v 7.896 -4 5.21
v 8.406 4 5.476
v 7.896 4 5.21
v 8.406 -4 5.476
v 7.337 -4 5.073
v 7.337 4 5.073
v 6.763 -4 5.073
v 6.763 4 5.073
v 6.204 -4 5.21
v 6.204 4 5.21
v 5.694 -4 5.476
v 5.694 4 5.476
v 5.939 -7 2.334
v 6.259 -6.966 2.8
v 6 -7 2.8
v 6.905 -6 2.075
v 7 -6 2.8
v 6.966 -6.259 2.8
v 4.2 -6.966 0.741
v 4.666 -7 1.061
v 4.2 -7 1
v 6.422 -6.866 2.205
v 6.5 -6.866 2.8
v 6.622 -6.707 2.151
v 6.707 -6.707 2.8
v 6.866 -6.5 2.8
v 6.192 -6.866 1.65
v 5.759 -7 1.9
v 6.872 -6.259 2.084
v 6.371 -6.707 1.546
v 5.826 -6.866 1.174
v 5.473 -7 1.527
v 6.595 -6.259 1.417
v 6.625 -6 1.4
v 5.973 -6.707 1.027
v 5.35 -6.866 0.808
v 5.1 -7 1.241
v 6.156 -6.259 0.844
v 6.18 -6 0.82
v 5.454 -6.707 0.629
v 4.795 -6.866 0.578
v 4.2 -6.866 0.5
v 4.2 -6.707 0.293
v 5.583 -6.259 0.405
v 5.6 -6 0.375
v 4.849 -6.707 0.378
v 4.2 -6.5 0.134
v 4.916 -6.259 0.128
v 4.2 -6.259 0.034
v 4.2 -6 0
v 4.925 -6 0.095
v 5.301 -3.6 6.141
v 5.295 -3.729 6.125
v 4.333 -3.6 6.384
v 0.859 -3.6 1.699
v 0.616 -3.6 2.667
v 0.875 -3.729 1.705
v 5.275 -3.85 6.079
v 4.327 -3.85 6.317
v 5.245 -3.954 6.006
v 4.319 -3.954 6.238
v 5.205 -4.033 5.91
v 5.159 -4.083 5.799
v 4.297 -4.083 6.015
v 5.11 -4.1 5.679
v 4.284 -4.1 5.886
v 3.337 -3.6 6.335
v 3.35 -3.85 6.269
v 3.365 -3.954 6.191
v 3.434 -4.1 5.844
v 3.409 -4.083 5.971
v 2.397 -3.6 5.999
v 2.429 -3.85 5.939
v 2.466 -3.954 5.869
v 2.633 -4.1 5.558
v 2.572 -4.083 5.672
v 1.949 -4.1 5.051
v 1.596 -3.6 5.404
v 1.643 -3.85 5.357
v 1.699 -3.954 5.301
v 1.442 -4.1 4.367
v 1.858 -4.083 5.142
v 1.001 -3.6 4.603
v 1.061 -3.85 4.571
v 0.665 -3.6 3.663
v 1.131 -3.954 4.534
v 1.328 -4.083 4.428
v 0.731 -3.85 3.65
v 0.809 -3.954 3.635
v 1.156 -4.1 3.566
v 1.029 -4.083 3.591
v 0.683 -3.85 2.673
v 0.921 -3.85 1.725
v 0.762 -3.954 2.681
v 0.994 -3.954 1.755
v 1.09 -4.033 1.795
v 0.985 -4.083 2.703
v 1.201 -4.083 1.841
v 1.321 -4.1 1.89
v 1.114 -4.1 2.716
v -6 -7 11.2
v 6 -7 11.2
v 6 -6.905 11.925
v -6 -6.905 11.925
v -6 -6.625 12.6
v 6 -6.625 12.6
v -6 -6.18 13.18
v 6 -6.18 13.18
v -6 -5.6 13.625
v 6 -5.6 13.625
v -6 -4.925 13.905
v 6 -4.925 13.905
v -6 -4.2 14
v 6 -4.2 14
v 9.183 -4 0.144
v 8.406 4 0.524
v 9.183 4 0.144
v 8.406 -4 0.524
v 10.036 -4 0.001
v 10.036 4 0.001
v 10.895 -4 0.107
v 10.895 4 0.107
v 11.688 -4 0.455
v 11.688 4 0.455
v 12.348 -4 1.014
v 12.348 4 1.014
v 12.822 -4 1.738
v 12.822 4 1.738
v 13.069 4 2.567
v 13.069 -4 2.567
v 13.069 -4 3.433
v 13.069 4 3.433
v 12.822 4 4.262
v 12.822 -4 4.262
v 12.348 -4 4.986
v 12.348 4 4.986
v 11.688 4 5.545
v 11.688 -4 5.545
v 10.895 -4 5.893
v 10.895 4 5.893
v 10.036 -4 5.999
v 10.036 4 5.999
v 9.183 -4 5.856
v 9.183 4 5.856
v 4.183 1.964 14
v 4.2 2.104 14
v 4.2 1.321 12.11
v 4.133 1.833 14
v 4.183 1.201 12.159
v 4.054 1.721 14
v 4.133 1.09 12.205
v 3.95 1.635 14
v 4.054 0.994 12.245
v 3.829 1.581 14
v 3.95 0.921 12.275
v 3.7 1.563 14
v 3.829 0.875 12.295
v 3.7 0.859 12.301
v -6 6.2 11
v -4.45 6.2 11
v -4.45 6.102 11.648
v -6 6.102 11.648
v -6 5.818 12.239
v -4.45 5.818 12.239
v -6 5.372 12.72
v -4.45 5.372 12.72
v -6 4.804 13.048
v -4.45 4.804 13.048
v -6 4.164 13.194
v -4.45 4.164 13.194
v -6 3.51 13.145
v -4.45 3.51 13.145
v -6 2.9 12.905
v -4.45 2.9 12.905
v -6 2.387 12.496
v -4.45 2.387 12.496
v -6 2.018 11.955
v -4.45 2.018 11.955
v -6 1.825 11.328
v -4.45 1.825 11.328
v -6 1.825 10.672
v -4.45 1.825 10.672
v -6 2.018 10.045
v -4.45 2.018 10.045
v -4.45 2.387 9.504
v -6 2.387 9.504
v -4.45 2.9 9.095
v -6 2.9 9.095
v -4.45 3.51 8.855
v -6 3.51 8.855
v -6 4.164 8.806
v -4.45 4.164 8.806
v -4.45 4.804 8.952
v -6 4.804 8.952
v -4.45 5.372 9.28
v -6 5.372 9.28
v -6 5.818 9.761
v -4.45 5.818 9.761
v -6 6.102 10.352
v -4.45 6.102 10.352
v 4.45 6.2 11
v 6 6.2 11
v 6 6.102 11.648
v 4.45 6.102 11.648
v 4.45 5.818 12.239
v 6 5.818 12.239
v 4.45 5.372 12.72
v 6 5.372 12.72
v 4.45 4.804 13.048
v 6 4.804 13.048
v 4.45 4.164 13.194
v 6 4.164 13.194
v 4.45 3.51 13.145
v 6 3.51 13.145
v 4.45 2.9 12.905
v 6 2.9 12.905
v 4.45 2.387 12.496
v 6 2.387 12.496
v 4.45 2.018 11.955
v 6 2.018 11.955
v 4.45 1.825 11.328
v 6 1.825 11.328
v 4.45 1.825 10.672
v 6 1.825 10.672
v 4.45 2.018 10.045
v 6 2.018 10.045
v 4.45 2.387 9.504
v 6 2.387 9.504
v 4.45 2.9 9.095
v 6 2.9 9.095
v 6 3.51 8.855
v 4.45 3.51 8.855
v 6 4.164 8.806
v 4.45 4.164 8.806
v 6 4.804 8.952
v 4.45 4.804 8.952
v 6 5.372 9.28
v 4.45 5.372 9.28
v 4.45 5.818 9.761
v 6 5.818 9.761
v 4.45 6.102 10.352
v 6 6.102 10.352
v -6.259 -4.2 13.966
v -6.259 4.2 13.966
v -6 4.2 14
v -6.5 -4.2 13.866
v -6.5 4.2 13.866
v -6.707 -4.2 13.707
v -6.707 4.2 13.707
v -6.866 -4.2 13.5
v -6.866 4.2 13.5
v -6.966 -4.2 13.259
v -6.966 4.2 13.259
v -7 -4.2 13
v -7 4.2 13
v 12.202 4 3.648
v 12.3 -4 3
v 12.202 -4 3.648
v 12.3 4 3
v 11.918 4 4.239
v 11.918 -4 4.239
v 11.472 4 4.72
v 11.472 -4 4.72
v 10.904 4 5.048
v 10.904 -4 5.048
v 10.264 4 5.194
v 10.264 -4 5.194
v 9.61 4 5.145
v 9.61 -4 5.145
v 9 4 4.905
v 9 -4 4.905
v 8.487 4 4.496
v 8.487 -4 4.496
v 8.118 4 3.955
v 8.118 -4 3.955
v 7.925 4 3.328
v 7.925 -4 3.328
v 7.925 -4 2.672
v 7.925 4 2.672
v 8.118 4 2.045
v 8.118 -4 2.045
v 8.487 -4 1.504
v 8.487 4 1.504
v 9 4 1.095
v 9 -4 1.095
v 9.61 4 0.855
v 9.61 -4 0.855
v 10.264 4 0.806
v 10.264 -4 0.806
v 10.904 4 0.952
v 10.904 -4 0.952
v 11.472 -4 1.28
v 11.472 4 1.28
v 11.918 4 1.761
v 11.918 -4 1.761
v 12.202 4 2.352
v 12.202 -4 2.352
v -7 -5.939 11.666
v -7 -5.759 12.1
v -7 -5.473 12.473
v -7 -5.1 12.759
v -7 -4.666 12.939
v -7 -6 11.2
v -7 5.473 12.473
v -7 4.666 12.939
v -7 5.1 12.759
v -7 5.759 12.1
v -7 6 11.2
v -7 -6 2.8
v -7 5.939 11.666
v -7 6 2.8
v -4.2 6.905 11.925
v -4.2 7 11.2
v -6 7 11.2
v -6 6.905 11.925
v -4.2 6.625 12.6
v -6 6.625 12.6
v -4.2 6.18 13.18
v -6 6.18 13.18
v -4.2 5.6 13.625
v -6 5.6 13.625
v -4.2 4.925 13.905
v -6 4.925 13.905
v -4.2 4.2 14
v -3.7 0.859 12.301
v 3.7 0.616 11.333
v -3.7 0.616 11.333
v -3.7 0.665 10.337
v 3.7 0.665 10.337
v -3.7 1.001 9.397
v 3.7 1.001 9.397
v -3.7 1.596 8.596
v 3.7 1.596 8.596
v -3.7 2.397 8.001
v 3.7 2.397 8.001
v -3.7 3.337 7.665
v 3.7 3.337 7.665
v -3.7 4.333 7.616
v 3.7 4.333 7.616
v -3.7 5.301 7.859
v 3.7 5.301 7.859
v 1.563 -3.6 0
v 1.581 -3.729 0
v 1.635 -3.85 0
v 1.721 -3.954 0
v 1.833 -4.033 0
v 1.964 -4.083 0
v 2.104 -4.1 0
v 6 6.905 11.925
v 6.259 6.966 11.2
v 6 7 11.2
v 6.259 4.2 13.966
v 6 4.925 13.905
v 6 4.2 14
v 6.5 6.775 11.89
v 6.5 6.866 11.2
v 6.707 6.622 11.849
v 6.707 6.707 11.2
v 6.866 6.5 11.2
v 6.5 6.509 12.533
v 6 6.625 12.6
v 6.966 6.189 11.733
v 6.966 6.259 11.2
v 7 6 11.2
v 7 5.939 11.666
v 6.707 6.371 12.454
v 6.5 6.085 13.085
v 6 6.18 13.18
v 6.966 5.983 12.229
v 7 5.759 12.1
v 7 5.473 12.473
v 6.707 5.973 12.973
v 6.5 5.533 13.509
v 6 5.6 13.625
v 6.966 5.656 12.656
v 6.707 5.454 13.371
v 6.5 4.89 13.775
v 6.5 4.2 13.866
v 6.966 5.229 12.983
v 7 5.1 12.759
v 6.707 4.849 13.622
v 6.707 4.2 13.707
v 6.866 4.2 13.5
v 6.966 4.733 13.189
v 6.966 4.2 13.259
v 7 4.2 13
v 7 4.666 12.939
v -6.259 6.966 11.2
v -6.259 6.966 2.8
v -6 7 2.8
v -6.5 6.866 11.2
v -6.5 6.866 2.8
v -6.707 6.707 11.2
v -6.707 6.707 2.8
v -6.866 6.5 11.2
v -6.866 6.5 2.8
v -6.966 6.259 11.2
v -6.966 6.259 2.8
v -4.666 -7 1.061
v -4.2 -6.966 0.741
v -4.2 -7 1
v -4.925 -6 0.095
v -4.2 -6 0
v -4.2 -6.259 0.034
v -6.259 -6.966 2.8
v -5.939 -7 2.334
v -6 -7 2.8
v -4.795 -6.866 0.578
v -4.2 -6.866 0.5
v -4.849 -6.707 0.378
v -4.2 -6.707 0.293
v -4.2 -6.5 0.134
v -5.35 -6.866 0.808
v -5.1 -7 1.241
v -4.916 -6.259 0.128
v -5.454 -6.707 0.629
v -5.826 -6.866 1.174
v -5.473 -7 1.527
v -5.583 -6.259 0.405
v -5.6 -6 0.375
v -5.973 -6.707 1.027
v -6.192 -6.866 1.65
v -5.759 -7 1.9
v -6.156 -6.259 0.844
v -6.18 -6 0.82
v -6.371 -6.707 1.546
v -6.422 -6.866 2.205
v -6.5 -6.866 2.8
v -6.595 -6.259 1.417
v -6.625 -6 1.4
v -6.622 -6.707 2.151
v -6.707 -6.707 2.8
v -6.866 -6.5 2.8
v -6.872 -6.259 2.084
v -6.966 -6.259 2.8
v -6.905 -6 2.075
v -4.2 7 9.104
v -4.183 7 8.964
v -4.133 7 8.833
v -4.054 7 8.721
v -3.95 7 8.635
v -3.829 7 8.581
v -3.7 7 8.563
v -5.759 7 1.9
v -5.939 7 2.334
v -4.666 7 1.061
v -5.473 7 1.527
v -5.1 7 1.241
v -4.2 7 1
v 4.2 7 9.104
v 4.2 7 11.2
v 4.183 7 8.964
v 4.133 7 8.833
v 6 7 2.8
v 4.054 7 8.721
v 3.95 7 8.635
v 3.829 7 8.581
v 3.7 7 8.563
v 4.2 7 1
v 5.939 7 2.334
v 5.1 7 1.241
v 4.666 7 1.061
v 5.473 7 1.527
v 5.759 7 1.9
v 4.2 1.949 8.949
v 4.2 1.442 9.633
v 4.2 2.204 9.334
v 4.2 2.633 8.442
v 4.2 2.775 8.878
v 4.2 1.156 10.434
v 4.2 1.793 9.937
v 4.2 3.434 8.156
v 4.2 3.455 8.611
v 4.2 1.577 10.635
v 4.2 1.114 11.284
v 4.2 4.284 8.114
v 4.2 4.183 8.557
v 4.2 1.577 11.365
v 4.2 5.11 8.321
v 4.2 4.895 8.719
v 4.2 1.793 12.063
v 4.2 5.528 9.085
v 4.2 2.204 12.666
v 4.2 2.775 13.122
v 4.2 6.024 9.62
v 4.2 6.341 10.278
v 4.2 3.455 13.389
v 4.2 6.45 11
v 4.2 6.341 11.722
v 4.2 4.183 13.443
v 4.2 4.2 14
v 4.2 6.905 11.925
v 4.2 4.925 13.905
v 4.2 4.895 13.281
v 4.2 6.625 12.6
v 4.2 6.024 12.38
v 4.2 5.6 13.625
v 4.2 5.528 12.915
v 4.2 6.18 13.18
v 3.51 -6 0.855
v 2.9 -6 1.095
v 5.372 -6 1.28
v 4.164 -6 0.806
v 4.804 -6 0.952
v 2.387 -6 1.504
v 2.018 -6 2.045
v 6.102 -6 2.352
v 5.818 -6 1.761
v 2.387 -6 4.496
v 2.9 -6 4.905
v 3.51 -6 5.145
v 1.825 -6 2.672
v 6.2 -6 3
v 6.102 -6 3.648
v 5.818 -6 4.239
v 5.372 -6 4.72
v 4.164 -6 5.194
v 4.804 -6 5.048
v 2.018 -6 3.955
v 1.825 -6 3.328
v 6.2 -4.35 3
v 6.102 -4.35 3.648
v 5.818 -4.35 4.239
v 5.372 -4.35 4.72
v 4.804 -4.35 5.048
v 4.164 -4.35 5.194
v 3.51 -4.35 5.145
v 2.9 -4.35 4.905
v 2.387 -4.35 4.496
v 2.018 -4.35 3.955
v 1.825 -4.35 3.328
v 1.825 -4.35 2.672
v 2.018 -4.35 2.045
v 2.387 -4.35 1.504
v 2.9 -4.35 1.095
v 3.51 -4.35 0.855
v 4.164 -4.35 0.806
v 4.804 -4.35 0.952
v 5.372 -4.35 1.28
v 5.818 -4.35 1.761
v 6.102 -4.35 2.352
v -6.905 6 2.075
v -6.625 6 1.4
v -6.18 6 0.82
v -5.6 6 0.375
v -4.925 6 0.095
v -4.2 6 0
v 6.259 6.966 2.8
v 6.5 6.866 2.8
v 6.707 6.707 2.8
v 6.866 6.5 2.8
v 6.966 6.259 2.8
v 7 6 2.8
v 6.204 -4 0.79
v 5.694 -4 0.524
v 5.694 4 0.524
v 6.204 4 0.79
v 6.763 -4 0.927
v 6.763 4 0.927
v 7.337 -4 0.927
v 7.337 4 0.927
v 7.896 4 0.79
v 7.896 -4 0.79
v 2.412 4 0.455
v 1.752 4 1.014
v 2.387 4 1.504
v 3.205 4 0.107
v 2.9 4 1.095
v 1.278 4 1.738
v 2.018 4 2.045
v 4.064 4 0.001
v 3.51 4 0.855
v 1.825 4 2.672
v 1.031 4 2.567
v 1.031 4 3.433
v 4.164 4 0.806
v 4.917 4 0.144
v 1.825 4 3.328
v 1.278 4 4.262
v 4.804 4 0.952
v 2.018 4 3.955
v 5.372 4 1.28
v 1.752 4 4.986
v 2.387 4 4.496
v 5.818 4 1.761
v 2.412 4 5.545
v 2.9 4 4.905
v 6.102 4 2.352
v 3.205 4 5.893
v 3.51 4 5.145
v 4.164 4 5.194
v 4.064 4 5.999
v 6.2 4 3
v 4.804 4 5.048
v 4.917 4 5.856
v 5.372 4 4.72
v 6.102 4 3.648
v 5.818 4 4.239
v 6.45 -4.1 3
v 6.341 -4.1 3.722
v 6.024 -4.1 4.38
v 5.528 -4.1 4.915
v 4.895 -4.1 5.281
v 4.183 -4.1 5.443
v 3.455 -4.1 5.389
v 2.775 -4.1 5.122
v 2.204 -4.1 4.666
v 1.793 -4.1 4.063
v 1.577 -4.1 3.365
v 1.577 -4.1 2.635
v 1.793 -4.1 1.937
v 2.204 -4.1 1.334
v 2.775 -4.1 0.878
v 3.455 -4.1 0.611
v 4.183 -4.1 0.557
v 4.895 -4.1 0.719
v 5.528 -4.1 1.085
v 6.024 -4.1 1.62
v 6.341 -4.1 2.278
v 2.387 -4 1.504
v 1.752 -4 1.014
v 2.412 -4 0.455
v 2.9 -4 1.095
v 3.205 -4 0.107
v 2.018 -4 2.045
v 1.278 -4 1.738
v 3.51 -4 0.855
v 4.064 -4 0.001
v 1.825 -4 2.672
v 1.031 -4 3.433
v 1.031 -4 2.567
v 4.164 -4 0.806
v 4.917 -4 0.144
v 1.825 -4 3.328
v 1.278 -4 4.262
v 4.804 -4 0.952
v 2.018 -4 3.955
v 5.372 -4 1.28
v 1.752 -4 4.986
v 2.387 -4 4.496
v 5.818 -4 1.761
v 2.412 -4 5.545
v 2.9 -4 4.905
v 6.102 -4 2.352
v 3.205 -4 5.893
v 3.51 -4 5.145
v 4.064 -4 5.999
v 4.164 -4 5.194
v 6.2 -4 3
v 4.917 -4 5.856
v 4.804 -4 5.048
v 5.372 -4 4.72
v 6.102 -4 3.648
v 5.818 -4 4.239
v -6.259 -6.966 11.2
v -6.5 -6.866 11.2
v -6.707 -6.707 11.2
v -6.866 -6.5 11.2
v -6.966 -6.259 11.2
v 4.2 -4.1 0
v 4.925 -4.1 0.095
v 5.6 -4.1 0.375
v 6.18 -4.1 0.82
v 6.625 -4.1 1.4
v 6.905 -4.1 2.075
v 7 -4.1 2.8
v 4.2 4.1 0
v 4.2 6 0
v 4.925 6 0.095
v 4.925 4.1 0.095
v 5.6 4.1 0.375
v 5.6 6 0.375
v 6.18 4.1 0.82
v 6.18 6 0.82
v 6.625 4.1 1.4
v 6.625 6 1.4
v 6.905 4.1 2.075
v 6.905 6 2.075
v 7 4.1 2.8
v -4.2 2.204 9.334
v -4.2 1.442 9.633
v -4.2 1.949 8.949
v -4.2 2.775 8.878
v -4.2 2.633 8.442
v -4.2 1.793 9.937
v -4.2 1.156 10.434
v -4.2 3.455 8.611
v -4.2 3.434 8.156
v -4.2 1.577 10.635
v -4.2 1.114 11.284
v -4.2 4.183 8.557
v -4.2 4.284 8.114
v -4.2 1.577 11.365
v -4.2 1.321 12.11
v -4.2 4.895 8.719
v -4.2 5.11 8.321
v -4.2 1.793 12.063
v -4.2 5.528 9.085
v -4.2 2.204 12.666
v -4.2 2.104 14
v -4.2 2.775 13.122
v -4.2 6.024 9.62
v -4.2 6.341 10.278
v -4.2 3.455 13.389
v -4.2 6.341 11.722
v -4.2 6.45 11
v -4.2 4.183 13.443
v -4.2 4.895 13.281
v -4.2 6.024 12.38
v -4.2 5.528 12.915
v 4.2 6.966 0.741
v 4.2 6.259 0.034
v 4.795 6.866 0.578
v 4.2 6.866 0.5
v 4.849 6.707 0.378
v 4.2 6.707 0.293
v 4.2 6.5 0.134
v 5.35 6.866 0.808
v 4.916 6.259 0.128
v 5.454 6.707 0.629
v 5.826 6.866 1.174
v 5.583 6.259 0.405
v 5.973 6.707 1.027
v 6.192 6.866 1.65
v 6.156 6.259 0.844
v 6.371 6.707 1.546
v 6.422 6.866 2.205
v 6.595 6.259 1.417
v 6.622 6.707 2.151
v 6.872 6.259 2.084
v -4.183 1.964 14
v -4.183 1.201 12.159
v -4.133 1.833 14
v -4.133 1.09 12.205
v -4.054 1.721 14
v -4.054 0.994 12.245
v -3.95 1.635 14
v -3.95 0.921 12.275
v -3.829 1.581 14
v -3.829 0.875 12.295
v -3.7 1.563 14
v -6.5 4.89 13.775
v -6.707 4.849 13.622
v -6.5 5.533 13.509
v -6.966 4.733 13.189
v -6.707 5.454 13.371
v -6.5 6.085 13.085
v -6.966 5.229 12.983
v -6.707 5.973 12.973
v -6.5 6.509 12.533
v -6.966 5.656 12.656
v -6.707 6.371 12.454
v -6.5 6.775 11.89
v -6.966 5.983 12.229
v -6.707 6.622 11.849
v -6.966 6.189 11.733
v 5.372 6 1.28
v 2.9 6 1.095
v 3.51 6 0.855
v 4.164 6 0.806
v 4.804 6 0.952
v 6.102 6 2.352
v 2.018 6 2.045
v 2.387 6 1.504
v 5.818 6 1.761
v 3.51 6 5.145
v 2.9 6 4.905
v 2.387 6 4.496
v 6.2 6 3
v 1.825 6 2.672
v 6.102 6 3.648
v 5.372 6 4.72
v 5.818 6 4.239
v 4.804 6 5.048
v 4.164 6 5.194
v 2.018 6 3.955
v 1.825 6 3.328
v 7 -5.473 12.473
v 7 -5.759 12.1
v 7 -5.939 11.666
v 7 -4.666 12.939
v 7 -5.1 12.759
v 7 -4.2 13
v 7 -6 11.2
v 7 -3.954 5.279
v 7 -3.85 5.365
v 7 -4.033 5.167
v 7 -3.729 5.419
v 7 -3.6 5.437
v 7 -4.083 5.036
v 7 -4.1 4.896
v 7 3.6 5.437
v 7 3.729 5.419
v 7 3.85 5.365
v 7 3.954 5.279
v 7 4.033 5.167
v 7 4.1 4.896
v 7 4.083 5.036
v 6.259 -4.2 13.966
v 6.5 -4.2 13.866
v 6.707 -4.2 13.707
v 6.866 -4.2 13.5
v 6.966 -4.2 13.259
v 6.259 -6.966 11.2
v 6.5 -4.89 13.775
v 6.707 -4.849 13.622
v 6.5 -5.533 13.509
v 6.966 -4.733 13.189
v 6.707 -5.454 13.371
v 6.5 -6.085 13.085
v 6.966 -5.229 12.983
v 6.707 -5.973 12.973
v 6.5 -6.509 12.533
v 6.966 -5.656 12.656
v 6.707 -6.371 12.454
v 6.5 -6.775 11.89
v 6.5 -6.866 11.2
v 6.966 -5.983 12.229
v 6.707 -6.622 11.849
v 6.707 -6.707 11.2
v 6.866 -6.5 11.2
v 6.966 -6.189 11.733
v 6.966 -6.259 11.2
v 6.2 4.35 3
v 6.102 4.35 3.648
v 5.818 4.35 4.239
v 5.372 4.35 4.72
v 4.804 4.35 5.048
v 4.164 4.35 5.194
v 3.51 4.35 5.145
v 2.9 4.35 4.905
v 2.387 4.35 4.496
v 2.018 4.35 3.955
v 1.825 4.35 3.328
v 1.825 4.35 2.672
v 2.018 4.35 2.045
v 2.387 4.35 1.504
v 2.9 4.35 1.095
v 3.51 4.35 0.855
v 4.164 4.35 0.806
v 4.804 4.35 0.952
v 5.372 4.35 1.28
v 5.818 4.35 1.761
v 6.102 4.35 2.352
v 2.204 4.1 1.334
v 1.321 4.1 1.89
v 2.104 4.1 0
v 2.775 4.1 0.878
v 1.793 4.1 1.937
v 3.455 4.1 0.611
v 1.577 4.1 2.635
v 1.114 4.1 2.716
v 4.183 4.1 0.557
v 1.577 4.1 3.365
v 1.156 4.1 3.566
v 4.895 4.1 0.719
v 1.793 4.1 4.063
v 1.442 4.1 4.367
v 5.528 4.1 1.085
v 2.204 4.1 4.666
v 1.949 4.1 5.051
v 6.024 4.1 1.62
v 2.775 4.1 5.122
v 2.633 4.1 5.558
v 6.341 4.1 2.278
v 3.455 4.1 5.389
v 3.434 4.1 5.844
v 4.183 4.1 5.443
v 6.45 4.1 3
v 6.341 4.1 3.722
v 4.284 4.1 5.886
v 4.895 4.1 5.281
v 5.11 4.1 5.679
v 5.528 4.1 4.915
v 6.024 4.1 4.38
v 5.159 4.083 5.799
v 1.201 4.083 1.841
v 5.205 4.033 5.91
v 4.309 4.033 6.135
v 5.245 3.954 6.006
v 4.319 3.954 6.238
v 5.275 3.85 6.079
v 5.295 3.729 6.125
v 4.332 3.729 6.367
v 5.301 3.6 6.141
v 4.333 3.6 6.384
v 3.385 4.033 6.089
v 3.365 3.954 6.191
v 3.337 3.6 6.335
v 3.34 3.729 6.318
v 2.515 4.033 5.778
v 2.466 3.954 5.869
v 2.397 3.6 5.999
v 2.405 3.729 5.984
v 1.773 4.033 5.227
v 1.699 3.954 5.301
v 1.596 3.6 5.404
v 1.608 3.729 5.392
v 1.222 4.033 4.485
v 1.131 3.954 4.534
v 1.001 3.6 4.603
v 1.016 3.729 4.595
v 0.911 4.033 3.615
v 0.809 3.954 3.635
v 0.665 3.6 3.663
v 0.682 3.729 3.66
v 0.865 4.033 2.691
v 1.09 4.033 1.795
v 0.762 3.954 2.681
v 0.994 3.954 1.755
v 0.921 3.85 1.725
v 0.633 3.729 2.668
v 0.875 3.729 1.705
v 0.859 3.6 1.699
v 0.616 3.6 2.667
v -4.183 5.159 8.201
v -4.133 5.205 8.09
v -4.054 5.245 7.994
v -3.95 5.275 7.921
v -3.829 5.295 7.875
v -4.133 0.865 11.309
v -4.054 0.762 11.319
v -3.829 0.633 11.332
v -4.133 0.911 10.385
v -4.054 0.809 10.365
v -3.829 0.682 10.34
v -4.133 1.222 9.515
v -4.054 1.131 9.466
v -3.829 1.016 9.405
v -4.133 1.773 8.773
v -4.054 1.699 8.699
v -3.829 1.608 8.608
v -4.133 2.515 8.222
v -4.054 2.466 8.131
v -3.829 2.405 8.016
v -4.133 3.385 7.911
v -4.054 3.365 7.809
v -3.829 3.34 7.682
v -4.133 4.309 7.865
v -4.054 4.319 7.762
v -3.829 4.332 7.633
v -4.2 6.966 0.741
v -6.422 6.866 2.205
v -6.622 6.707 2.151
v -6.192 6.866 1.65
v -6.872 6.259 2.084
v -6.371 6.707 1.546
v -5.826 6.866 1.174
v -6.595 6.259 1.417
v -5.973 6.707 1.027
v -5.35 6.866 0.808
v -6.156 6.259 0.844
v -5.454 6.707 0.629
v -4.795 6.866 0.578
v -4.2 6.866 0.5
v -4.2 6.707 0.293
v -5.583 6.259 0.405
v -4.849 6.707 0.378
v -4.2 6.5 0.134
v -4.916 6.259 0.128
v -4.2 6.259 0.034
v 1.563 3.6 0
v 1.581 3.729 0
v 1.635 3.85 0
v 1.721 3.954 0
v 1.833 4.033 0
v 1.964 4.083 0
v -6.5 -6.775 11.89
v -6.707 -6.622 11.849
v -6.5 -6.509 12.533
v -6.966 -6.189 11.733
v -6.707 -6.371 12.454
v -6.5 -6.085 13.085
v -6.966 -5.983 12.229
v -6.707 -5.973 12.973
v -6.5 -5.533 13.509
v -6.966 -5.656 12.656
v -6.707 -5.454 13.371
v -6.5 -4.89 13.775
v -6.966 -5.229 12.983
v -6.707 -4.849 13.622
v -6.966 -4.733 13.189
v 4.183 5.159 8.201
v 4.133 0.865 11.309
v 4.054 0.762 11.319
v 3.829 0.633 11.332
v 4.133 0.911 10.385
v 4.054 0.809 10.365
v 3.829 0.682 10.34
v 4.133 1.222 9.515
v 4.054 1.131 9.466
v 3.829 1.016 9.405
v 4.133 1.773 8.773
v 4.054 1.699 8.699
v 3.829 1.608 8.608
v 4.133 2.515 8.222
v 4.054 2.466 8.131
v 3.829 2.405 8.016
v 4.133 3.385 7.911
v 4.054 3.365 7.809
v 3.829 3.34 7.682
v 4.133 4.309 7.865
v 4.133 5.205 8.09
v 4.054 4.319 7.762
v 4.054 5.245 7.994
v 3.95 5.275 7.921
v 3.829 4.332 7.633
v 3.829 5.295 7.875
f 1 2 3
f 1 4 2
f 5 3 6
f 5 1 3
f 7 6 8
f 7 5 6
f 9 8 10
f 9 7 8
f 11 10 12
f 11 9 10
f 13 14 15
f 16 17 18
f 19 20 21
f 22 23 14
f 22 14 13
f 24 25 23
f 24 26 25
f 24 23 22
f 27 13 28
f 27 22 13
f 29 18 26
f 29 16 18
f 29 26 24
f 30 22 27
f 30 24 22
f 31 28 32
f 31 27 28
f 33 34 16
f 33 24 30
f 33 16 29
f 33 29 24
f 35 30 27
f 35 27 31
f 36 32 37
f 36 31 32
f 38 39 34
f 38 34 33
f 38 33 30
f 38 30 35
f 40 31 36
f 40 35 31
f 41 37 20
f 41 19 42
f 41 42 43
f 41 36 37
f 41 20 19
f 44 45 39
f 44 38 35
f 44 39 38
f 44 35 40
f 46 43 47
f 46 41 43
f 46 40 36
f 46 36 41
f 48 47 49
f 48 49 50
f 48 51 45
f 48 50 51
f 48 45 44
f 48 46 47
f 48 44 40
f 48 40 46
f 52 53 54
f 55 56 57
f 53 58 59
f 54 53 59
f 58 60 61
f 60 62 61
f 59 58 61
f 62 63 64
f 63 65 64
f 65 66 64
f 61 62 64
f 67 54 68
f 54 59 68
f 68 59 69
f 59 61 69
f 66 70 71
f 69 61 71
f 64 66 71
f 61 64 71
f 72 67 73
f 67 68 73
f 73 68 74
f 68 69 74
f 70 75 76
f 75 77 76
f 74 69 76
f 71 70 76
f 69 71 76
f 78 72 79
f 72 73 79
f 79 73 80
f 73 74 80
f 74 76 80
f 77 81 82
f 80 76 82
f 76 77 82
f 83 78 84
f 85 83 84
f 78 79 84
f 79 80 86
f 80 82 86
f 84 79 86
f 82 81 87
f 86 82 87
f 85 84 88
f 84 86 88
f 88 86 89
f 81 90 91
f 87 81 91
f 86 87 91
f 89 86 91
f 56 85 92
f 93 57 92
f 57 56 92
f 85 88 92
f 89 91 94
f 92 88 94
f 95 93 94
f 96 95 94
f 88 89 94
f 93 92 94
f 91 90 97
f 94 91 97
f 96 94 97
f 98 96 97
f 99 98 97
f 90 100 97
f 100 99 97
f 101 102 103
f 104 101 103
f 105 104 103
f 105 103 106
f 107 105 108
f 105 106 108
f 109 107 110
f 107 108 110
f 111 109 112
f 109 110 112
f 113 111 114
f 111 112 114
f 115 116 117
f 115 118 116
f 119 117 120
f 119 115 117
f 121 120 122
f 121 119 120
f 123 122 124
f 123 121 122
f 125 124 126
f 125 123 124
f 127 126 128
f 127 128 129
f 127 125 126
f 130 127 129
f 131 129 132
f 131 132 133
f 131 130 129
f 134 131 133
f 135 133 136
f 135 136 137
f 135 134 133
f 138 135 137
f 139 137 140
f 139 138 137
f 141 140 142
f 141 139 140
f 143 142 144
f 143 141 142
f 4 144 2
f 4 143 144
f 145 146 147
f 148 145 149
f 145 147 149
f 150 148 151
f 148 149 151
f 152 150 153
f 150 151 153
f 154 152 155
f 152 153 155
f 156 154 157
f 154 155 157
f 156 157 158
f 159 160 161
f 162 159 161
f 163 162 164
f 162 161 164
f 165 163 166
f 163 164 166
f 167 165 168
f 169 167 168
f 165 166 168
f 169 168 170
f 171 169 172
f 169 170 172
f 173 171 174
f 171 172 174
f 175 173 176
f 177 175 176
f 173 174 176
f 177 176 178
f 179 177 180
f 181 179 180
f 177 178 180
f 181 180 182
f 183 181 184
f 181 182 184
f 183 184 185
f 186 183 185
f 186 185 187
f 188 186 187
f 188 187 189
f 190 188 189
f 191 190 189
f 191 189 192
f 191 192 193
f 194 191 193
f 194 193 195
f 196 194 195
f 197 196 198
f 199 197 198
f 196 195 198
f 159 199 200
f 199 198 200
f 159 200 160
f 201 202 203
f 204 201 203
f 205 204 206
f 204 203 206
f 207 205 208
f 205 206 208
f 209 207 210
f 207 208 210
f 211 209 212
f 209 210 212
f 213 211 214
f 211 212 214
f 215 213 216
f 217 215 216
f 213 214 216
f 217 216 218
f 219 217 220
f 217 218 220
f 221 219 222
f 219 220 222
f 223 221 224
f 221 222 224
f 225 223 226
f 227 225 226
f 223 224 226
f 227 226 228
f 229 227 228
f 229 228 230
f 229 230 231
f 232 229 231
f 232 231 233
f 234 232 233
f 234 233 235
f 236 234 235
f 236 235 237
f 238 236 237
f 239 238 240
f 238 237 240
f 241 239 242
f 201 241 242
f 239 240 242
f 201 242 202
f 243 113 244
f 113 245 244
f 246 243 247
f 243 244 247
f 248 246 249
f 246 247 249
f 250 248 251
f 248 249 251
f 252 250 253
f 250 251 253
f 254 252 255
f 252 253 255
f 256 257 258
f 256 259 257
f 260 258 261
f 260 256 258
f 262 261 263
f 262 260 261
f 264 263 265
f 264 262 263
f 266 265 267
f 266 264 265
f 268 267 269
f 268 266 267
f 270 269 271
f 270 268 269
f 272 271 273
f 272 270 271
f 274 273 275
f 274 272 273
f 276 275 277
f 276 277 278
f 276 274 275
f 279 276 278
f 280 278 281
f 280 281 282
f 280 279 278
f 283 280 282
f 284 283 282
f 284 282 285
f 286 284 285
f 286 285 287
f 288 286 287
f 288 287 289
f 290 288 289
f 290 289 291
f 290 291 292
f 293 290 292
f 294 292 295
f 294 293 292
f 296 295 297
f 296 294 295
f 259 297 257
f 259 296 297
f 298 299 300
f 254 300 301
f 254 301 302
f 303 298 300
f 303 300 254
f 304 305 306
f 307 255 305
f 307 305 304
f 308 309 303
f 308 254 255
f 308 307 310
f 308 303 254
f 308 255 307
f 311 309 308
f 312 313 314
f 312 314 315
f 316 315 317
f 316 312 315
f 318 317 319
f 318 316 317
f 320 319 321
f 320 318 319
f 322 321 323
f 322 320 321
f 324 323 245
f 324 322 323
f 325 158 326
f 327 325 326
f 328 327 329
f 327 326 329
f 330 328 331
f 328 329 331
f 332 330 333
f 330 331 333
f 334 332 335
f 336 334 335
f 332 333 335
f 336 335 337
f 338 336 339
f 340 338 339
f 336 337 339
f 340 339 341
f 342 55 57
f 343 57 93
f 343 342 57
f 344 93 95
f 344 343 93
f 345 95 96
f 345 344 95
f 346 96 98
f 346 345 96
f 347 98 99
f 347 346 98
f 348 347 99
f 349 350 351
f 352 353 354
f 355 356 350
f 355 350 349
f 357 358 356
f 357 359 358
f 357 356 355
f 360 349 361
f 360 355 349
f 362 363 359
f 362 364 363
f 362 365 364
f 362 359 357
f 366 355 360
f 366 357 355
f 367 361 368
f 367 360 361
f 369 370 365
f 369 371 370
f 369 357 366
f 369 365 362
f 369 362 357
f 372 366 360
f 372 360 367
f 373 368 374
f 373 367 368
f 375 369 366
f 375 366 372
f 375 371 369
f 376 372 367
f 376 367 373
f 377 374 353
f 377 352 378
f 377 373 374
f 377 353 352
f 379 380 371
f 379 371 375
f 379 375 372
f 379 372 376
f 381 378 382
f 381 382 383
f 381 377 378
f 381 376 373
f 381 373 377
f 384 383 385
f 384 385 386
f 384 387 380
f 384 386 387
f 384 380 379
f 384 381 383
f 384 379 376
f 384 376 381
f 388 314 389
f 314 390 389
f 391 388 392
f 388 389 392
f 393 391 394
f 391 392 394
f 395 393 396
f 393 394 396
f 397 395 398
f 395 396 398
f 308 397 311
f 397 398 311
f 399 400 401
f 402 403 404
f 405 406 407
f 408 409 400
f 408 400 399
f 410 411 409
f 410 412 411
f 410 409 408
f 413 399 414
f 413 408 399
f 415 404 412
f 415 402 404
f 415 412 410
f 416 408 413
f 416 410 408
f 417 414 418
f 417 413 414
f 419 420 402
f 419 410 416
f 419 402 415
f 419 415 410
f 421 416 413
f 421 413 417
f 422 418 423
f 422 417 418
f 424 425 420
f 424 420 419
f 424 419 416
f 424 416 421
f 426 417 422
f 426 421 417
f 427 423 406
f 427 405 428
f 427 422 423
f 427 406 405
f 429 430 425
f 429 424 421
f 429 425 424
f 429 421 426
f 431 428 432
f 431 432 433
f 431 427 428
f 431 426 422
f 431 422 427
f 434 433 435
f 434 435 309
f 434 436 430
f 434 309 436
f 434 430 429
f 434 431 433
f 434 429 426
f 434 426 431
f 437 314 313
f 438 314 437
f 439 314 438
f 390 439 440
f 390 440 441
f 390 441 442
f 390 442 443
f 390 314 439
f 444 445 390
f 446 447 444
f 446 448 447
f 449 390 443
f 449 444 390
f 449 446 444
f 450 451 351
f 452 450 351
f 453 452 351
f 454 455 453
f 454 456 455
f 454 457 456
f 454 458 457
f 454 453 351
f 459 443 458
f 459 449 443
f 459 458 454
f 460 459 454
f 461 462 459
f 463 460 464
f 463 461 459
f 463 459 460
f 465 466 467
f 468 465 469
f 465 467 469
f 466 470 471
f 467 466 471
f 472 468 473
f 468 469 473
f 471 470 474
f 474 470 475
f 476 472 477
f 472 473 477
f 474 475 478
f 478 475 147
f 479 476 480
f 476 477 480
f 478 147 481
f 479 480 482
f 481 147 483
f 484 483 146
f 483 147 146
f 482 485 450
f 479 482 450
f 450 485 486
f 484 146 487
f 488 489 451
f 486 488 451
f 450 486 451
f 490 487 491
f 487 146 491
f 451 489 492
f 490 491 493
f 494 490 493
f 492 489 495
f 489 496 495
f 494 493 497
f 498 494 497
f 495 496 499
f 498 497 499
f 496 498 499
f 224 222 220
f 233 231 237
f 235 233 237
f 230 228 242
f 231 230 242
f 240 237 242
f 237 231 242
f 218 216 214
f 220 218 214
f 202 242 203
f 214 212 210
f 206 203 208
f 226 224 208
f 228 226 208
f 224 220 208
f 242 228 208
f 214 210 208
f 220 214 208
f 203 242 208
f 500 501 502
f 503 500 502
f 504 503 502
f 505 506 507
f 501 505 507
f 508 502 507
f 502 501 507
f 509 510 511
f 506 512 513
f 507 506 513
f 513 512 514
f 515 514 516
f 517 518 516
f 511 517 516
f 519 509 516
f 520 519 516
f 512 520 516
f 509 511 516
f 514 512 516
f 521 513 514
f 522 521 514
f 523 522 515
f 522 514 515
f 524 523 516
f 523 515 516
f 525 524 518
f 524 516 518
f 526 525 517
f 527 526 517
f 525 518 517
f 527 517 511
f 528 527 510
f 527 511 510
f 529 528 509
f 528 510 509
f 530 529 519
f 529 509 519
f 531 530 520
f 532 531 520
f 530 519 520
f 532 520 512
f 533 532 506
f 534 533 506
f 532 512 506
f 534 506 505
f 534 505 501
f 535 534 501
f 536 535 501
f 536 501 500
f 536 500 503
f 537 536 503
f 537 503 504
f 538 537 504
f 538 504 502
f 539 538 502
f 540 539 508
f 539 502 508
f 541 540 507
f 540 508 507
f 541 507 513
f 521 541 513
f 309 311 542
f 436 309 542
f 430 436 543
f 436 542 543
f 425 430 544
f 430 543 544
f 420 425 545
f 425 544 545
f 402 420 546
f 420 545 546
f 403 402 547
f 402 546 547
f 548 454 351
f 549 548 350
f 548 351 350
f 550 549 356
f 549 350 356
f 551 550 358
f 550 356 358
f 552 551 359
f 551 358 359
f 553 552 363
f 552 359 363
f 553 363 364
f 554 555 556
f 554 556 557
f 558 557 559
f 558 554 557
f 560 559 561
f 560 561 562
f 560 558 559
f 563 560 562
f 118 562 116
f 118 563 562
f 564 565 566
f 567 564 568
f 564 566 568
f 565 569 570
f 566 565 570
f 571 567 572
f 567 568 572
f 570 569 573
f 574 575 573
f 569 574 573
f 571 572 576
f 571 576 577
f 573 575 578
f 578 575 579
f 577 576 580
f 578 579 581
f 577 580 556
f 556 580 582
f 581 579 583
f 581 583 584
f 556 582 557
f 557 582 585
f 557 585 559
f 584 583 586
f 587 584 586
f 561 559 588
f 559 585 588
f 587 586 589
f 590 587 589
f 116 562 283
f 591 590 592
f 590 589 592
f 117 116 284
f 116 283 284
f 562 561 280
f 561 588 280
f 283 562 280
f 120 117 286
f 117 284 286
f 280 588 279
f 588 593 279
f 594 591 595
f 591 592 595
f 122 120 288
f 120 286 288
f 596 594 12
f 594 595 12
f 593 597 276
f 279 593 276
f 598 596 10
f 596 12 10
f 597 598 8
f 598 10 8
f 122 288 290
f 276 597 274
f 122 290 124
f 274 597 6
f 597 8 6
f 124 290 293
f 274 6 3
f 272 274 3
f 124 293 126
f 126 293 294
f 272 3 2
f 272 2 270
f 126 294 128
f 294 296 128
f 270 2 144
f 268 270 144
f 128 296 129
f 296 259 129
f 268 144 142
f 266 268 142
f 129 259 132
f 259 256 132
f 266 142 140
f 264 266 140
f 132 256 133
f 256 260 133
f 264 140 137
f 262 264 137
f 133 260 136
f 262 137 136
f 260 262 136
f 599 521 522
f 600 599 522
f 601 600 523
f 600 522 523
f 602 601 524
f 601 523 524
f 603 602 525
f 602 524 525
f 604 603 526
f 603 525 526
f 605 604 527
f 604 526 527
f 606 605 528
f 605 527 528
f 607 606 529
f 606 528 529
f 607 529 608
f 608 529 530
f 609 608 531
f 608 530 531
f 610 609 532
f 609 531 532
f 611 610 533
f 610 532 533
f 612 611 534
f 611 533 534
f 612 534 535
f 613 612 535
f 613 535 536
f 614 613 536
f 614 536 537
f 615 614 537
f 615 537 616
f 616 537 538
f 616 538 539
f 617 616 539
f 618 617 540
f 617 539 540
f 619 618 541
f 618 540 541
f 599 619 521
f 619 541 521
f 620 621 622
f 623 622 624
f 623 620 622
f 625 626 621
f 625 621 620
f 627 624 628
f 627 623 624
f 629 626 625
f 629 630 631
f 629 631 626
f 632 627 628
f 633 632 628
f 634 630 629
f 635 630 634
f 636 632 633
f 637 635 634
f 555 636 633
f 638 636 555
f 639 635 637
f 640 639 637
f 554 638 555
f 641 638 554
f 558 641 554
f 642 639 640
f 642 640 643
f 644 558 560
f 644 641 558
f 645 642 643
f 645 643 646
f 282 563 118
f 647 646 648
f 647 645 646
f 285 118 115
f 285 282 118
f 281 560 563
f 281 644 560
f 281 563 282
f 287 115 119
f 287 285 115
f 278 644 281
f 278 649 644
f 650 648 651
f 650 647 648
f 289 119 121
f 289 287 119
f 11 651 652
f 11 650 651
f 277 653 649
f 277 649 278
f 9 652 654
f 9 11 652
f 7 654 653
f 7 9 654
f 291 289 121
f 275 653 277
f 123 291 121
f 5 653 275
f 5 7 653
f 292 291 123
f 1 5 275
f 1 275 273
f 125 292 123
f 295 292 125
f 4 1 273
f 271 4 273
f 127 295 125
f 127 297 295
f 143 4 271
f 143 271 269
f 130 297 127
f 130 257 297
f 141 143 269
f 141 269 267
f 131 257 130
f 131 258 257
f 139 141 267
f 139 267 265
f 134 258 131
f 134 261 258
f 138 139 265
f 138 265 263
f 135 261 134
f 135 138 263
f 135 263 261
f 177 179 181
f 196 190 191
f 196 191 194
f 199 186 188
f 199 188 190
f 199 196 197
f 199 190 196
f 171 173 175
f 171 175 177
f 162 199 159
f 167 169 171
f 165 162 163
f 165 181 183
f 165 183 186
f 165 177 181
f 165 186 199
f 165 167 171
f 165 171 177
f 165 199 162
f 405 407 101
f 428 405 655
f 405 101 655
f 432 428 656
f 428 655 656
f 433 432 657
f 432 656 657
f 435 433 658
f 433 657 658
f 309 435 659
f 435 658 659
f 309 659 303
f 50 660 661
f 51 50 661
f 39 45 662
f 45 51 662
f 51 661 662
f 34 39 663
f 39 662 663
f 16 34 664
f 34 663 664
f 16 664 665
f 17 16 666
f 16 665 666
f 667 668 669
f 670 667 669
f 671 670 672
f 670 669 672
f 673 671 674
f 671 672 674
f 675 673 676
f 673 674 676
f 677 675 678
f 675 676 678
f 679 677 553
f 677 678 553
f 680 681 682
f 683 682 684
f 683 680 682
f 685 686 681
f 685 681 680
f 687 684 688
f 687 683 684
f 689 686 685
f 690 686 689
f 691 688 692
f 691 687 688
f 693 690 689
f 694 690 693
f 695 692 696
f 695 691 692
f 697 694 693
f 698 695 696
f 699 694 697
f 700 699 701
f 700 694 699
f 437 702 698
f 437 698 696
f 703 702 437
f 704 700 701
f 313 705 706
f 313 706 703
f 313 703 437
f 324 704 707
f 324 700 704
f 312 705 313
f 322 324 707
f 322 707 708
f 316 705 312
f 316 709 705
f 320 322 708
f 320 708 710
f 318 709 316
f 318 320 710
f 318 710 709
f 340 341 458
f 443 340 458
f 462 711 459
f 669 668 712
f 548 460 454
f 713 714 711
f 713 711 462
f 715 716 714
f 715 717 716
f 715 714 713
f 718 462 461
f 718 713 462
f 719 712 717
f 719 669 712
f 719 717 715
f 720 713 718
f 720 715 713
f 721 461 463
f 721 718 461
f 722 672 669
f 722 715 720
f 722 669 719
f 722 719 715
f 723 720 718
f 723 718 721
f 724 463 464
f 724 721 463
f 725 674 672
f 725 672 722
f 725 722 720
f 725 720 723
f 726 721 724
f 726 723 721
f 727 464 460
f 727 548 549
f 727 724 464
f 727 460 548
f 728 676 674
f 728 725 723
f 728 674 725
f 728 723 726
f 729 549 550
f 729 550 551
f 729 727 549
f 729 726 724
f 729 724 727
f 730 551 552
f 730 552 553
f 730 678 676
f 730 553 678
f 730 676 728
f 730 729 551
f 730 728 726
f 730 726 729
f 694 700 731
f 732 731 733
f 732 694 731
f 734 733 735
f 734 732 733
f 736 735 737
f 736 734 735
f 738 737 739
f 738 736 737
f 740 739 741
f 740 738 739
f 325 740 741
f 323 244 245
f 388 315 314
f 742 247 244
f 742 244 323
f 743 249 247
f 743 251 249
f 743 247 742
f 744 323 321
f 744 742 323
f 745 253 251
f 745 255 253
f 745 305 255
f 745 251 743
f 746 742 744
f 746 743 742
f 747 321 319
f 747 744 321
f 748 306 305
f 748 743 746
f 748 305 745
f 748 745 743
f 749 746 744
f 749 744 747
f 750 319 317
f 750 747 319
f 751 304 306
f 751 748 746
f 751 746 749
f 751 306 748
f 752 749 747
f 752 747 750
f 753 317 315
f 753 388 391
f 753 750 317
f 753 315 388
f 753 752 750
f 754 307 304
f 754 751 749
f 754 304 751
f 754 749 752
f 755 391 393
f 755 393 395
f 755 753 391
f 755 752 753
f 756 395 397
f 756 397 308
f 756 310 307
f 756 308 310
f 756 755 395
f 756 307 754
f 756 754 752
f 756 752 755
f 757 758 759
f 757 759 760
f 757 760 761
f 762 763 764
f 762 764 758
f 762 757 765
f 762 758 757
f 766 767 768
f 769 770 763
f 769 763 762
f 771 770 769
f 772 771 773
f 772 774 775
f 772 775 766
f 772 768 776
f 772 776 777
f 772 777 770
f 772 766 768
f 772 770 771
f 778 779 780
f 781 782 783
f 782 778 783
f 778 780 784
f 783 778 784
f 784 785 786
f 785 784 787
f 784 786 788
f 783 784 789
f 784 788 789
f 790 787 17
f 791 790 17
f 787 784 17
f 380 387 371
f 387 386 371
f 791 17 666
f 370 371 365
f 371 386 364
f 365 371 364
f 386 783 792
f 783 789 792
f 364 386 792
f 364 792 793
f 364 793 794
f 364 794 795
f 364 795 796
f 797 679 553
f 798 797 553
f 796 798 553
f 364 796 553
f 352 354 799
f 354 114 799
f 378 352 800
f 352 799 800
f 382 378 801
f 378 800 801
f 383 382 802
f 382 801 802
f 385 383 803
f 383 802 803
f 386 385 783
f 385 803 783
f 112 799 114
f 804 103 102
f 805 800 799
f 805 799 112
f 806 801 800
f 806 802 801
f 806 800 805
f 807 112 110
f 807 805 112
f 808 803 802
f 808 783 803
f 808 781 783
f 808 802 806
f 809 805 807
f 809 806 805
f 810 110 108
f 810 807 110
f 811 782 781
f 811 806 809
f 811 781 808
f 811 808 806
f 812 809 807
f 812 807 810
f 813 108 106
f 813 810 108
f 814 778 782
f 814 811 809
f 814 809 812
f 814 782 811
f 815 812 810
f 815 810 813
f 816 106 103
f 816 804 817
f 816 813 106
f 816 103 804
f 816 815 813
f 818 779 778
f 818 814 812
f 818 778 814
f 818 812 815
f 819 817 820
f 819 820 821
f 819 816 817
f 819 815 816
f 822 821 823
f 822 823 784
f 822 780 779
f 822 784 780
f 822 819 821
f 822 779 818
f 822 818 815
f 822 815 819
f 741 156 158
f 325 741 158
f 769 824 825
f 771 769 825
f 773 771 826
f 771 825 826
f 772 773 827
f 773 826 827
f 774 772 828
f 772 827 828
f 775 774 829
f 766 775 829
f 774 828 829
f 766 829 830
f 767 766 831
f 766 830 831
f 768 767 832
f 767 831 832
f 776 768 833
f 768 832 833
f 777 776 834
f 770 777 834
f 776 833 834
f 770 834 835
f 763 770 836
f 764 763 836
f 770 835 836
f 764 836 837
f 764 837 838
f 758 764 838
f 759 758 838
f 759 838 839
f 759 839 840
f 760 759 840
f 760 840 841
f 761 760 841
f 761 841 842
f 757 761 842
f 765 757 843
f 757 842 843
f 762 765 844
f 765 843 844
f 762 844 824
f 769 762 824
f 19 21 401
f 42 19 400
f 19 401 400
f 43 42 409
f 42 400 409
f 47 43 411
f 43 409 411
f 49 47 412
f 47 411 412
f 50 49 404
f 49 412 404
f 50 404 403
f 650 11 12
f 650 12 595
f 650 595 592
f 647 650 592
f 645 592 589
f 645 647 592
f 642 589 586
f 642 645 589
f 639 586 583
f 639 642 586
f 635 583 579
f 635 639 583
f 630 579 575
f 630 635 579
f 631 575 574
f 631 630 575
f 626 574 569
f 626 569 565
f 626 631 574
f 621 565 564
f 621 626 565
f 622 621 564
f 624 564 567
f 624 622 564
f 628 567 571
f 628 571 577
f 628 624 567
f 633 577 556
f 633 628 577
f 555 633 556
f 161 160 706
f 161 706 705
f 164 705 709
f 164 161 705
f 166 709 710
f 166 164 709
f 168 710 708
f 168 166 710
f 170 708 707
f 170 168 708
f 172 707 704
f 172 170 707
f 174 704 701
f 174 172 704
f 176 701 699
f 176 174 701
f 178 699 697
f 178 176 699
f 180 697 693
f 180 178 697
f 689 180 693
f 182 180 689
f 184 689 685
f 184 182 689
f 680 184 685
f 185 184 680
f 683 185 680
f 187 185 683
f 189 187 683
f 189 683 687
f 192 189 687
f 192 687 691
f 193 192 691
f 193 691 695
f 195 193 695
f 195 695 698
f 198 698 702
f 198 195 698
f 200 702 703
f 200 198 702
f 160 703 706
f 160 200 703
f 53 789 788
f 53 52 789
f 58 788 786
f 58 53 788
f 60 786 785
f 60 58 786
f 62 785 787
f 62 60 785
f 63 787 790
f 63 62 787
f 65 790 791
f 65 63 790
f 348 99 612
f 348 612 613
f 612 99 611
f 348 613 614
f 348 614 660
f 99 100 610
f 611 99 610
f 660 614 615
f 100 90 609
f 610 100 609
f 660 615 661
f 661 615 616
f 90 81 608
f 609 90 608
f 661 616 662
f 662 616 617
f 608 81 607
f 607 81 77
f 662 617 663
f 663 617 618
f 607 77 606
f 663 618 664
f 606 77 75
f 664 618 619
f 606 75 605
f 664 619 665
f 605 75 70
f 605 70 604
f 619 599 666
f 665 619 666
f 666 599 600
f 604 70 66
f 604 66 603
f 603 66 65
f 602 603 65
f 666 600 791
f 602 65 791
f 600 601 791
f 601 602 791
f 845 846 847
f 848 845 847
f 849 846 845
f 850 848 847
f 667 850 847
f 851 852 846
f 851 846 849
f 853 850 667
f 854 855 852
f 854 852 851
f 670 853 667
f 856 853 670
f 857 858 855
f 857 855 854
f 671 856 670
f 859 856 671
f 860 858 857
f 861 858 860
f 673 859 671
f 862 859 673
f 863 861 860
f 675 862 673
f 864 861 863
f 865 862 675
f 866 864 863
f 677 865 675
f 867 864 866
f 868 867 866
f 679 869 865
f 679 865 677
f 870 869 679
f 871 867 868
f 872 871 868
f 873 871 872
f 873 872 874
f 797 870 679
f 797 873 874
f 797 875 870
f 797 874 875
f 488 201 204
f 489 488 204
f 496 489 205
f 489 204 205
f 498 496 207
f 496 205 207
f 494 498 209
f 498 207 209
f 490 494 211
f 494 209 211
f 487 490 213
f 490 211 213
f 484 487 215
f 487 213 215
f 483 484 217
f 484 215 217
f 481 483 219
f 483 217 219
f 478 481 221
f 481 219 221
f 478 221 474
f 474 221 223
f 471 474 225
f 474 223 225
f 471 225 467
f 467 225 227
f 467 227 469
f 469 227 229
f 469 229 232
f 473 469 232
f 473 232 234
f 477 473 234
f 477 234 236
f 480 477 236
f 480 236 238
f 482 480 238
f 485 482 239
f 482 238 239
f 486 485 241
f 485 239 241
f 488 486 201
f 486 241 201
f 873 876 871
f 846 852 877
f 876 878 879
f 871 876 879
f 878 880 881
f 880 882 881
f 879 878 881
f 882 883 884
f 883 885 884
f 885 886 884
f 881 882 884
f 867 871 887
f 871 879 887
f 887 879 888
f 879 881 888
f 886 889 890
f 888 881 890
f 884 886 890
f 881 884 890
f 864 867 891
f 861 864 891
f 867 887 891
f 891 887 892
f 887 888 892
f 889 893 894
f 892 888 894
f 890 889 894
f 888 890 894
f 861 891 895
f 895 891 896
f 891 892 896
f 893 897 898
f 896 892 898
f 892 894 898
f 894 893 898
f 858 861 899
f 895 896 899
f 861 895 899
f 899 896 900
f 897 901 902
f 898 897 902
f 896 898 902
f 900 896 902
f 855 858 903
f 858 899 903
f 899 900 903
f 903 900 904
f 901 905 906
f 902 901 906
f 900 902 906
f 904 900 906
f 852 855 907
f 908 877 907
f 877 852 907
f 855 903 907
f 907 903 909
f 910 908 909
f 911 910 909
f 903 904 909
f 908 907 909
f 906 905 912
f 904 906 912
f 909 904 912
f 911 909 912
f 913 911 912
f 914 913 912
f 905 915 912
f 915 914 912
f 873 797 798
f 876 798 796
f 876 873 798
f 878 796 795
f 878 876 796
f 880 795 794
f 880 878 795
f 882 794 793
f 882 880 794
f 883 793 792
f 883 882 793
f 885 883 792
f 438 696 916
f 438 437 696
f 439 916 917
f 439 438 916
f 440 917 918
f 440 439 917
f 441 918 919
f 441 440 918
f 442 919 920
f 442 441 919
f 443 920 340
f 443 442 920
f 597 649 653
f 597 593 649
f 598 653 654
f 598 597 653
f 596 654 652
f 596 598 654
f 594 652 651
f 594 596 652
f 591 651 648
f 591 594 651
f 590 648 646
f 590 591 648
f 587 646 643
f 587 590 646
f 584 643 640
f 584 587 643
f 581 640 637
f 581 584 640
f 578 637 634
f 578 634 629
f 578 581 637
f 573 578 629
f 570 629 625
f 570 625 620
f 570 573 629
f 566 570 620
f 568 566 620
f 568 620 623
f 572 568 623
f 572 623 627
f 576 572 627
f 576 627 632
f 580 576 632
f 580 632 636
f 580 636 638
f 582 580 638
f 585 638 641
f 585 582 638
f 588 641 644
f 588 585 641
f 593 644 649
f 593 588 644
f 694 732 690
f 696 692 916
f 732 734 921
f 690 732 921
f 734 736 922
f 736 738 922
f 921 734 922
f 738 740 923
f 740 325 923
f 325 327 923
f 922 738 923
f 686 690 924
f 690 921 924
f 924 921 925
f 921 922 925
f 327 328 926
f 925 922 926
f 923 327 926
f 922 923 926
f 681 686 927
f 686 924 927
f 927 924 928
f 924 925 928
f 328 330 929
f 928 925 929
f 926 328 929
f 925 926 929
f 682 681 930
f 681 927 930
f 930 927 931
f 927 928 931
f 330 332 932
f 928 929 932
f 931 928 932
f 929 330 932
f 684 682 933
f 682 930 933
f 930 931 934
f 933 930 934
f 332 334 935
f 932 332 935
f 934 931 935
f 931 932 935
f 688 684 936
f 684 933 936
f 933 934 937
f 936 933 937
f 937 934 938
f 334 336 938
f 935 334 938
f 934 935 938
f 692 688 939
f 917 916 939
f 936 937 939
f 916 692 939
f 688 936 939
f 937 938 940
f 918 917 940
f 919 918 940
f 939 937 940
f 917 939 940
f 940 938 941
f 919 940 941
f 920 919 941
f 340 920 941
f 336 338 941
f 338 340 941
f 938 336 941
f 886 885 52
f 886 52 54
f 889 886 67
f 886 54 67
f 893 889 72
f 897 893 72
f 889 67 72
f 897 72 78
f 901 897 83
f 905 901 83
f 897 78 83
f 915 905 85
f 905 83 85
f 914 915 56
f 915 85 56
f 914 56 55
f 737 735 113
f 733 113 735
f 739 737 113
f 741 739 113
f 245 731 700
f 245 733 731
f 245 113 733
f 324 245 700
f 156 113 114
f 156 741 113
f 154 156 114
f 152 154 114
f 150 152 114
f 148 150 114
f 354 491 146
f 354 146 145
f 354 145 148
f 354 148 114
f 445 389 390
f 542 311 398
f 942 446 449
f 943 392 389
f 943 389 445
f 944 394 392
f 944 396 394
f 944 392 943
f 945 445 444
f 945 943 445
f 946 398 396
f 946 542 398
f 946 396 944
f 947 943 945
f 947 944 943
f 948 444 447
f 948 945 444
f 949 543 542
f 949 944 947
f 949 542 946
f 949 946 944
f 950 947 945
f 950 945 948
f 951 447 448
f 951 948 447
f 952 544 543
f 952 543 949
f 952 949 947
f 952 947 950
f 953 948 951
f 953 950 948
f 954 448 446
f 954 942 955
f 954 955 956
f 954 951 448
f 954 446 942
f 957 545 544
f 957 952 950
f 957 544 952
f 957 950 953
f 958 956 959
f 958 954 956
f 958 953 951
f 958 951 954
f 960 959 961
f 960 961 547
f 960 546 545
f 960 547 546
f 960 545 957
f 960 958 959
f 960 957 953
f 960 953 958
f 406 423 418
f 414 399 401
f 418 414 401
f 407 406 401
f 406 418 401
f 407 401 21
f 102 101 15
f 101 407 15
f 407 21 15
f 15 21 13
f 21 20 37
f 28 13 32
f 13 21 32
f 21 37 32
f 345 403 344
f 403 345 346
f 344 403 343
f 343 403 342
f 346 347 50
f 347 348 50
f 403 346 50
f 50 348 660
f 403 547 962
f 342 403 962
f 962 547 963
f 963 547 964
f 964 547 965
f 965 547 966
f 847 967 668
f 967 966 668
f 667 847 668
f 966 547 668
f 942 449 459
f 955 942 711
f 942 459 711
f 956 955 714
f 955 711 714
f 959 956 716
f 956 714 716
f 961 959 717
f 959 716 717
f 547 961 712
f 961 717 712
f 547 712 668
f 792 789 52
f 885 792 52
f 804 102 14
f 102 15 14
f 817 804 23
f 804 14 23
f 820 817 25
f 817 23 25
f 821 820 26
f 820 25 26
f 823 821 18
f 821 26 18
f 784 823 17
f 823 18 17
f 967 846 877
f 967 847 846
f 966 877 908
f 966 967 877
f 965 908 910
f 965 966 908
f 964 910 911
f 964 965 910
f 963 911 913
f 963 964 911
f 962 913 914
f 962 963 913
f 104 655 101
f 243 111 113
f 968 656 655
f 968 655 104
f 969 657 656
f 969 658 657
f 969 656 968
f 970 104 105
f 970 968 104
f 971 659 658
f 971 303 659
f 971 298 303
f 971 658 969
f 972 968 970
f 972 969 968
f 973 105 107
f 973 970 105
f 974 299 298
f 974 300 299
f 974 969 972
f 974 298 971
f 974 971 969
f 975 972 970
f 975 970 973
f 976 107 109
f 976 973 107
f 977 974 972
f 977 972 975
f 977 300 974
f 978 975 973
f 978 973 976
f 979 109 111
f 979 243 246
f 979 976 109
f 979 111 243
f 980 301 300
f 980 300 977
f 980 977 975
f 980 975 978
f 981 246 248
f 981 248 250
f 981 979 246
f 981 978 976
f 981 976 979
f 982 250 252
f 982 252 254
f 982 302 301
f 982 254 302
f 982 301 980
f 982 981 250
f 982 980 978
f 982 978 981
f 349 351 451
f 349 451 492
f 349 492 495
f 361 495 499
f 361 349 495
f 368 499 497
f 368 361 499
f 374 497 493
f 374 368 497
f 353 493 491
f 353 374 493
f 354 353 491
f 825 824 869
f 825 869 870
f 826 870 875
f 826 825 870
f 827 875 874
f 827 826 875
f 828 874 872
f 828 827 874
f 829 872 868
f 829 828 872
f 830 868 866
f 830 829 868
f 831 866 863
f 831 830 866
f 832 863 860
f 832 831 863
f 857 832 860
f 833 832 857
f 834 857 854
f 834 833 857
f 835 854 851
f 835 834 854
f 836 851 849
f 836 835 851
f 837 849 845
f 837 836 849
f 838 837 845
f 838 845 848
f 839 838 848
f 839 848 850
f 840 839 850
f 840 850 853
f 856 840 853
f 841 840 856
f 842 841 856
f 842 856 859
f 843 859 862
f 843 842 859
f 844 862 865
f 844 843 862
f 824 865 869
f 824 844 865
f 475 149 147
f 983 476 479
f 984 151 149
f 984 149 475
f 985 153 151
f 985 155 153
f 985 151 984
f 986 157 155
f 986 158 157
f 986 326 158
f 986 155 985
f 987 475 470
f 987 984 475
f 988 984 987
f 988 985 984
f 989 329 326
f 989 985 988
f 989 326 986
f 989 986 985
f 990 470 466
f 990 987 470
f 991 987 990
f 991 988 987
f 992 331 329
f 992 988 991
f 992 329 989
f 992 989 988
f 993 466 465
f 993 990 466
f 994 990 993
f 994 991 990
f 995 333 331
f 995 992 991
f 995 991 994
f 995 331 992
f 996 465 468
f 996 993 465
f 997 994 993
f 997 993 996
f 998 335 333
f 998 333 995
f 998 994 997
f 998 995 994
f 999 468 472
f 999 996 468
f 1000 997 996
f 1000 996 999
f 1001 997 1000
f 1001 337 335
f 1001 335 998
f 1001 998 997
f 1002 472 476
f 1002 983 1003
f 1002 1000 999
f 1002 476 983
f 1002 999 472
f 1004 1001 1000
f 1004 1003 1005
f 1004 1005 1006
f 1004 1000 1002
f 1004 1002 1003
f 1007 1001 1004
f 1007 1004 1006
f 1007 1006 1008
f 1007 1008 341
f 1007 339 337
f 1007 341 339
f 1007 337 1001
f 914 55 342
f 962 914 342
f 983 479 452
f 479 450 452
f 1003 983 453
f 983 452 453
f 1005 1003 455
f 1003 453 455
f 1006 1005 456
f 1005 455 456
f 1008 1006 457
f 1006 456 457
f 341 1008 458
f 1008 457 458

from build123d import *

# Parameters (mm, degrees)
F4_W      = 14
F4_H      = 14
F5_DEPTH  = 14
F6_R      = 2.2
F8_DEPTH  = 4.1
F9_DEPTH  = 6
F10_R     = 2.2
F11_DEPTH = 4.2
F12_DEPTH = 6
F13_R     = 2.8
F14_R     = 0.5
F15_R     = 2.2
F16_DEPTH = 4
F17_SIZE  = 0.25
F18_R     = 1


with BuildPart() as f5:
    # F4 (on Top) → F5 (new body)
    with BuildSketch(Plane.XY):
        Rectangle(F4_W, F4_H)
    extrude(amount=F5_DEPTH)

    # F6 (on Front) → F8 (cut, symmetric)
    with BuildSketch(Plane.XZ):
        with BuildLine():
            Line((1.5625072061, 0), (7, 0))
            Line((7, 0), (7, 5.4374927939))
            Line((7, 5.4374927939), (5.30112367, 6.1411904105))
            ThreePointArc((5.30112367, 6.1411904105), (1.595836944, 5.404163056), (0.8588095895, 1.69887633))
            Line((0.8588095895, 1.69887633), (1.5625072061, 0))
        make_face()
        with Locations((4, 3)):
            Circle(F6_R, mode=Mode.SUBTRACT)
        with Locations((4, 3)):
            Circle(F6_R)
    extrude(amount=F8_DEPTH, both=True, mode=Mode.SUBTRACT)

    # F6 (on Front) → F9 (cut, symmetric)
    with BuildSketch(Plane.XZ):
        with Locations((4, 3)):
            Circle(F6_R)
    extrude(amount=F9_DEPTH, both=True, mode=Mode.SUBTRACT)

    # F10 (on Right) → F11 (cut, symmetric)
    with BuildSketch(Plane.YZ):
        with BuildLine():
            Line((7, 14), (1.5625072061, 14))
            Line((1.5625072061, 14), (0.8588095895, 12.30112367))
            ThreePointArc((0.8588095895, 12.30112367), (1.595836944, 8.595836944), (5.30112367, 7.8588095895))
            Line((5.30112367, 7.8588095895), (7, 8.5625072061))
            Line((7, 8.5625072061), (7, 14))
        make_face()
        with Locations((4, 11)):
            Circle(F10_R, mode=Mode.SUBTRACT)
        with Locations((4, 11)):
            Circle(F10_R)
    extrude(amount=F11_DEPTH, both=True, mode=Mode.SUBTRACT)

    # F10 (on Right) → F12 (cut, symmetric)
    with BuildSketch(Plane.YZ):
        with Locations((4, 11)):
            Circle(F10_R)
    extrude(amount=F12_DEPTH, both=True, mode=Mode.SUBTRACT)

    # F13
    f13_edges = [f5.edges().sort_by_distance(p)[0] for p in [
        (7, -5.55, 0),
        (7, 5.55, 0),
        (-5.6, 7, 14),
        (5.6, 7, 14),
        (0, -7, 14),
        (-7, 0, 0),
    ]]
    fillet(f13_edges, radius=F13_R)

    # F14
    f14_edges = [f5.edges().sort_by_distance(p)[0] for p in [
        (1.210658, -4.1, 0.849438),
        (1.210658, 4.1, 0.849438),
        (4.2, 6.150562, 8.210658),
        (-4.2, 6.150562, 8.210658),
    ]]
    fillet(f14_edges, radius=F14_R)

    # F17
    f17_edges = [f5.edges().sort_by_distance(p)[0] for p in [
        (1.8, 4.1, 3),
        (1.8, -4.1, 3),
        (-4.2, 1.8, 11),
        (4.2, 1.8, 11),
    ]]
    chamfer(f17_edges, length=F17_SIZE)

    # F18
    f18_edges = [f5.edges().sort_by_distance(p)[0] for p in [
        (-7, 0, 14),
    ]]
    fillet(f18_edges, radius=F18_R)


with BuildPart() as f16:
    # F15 (on Front) → F16 (new body, symmetric)
    with BuildSketch(Plane.XZ):
        with BuildLine():
            ThreePointArc((8.4055555556, 5.4756530501), (7.05, 5.0561754903), (5.6944444444, 5.4756530501))
            ThreePointArc((5.6944444444, 5.4756530501), (1, 3), (5.6944444444, 0.5243469499))
            ThreePointArc((5.6944444444, 0.5243469499), (7.05, 0.9438245097), (8.4055555556, 0.5243469499))
            ThreePointArc((8.4055555556, 0.5243469499), (13.1, 3), (8.4055555556, 5.4756530501))
        make_face()
        with Locations((4, 3)):
            Circle(F15_R, mode=Mode.SUBTRACT)
        with Locations((10.1, 3)):
            Circle(F15_R, mode=Mode.SUBTRACT)
    extrude(amount=F16_DEPTH, both=True)


solid = Compound([f5.part, f16.part])
